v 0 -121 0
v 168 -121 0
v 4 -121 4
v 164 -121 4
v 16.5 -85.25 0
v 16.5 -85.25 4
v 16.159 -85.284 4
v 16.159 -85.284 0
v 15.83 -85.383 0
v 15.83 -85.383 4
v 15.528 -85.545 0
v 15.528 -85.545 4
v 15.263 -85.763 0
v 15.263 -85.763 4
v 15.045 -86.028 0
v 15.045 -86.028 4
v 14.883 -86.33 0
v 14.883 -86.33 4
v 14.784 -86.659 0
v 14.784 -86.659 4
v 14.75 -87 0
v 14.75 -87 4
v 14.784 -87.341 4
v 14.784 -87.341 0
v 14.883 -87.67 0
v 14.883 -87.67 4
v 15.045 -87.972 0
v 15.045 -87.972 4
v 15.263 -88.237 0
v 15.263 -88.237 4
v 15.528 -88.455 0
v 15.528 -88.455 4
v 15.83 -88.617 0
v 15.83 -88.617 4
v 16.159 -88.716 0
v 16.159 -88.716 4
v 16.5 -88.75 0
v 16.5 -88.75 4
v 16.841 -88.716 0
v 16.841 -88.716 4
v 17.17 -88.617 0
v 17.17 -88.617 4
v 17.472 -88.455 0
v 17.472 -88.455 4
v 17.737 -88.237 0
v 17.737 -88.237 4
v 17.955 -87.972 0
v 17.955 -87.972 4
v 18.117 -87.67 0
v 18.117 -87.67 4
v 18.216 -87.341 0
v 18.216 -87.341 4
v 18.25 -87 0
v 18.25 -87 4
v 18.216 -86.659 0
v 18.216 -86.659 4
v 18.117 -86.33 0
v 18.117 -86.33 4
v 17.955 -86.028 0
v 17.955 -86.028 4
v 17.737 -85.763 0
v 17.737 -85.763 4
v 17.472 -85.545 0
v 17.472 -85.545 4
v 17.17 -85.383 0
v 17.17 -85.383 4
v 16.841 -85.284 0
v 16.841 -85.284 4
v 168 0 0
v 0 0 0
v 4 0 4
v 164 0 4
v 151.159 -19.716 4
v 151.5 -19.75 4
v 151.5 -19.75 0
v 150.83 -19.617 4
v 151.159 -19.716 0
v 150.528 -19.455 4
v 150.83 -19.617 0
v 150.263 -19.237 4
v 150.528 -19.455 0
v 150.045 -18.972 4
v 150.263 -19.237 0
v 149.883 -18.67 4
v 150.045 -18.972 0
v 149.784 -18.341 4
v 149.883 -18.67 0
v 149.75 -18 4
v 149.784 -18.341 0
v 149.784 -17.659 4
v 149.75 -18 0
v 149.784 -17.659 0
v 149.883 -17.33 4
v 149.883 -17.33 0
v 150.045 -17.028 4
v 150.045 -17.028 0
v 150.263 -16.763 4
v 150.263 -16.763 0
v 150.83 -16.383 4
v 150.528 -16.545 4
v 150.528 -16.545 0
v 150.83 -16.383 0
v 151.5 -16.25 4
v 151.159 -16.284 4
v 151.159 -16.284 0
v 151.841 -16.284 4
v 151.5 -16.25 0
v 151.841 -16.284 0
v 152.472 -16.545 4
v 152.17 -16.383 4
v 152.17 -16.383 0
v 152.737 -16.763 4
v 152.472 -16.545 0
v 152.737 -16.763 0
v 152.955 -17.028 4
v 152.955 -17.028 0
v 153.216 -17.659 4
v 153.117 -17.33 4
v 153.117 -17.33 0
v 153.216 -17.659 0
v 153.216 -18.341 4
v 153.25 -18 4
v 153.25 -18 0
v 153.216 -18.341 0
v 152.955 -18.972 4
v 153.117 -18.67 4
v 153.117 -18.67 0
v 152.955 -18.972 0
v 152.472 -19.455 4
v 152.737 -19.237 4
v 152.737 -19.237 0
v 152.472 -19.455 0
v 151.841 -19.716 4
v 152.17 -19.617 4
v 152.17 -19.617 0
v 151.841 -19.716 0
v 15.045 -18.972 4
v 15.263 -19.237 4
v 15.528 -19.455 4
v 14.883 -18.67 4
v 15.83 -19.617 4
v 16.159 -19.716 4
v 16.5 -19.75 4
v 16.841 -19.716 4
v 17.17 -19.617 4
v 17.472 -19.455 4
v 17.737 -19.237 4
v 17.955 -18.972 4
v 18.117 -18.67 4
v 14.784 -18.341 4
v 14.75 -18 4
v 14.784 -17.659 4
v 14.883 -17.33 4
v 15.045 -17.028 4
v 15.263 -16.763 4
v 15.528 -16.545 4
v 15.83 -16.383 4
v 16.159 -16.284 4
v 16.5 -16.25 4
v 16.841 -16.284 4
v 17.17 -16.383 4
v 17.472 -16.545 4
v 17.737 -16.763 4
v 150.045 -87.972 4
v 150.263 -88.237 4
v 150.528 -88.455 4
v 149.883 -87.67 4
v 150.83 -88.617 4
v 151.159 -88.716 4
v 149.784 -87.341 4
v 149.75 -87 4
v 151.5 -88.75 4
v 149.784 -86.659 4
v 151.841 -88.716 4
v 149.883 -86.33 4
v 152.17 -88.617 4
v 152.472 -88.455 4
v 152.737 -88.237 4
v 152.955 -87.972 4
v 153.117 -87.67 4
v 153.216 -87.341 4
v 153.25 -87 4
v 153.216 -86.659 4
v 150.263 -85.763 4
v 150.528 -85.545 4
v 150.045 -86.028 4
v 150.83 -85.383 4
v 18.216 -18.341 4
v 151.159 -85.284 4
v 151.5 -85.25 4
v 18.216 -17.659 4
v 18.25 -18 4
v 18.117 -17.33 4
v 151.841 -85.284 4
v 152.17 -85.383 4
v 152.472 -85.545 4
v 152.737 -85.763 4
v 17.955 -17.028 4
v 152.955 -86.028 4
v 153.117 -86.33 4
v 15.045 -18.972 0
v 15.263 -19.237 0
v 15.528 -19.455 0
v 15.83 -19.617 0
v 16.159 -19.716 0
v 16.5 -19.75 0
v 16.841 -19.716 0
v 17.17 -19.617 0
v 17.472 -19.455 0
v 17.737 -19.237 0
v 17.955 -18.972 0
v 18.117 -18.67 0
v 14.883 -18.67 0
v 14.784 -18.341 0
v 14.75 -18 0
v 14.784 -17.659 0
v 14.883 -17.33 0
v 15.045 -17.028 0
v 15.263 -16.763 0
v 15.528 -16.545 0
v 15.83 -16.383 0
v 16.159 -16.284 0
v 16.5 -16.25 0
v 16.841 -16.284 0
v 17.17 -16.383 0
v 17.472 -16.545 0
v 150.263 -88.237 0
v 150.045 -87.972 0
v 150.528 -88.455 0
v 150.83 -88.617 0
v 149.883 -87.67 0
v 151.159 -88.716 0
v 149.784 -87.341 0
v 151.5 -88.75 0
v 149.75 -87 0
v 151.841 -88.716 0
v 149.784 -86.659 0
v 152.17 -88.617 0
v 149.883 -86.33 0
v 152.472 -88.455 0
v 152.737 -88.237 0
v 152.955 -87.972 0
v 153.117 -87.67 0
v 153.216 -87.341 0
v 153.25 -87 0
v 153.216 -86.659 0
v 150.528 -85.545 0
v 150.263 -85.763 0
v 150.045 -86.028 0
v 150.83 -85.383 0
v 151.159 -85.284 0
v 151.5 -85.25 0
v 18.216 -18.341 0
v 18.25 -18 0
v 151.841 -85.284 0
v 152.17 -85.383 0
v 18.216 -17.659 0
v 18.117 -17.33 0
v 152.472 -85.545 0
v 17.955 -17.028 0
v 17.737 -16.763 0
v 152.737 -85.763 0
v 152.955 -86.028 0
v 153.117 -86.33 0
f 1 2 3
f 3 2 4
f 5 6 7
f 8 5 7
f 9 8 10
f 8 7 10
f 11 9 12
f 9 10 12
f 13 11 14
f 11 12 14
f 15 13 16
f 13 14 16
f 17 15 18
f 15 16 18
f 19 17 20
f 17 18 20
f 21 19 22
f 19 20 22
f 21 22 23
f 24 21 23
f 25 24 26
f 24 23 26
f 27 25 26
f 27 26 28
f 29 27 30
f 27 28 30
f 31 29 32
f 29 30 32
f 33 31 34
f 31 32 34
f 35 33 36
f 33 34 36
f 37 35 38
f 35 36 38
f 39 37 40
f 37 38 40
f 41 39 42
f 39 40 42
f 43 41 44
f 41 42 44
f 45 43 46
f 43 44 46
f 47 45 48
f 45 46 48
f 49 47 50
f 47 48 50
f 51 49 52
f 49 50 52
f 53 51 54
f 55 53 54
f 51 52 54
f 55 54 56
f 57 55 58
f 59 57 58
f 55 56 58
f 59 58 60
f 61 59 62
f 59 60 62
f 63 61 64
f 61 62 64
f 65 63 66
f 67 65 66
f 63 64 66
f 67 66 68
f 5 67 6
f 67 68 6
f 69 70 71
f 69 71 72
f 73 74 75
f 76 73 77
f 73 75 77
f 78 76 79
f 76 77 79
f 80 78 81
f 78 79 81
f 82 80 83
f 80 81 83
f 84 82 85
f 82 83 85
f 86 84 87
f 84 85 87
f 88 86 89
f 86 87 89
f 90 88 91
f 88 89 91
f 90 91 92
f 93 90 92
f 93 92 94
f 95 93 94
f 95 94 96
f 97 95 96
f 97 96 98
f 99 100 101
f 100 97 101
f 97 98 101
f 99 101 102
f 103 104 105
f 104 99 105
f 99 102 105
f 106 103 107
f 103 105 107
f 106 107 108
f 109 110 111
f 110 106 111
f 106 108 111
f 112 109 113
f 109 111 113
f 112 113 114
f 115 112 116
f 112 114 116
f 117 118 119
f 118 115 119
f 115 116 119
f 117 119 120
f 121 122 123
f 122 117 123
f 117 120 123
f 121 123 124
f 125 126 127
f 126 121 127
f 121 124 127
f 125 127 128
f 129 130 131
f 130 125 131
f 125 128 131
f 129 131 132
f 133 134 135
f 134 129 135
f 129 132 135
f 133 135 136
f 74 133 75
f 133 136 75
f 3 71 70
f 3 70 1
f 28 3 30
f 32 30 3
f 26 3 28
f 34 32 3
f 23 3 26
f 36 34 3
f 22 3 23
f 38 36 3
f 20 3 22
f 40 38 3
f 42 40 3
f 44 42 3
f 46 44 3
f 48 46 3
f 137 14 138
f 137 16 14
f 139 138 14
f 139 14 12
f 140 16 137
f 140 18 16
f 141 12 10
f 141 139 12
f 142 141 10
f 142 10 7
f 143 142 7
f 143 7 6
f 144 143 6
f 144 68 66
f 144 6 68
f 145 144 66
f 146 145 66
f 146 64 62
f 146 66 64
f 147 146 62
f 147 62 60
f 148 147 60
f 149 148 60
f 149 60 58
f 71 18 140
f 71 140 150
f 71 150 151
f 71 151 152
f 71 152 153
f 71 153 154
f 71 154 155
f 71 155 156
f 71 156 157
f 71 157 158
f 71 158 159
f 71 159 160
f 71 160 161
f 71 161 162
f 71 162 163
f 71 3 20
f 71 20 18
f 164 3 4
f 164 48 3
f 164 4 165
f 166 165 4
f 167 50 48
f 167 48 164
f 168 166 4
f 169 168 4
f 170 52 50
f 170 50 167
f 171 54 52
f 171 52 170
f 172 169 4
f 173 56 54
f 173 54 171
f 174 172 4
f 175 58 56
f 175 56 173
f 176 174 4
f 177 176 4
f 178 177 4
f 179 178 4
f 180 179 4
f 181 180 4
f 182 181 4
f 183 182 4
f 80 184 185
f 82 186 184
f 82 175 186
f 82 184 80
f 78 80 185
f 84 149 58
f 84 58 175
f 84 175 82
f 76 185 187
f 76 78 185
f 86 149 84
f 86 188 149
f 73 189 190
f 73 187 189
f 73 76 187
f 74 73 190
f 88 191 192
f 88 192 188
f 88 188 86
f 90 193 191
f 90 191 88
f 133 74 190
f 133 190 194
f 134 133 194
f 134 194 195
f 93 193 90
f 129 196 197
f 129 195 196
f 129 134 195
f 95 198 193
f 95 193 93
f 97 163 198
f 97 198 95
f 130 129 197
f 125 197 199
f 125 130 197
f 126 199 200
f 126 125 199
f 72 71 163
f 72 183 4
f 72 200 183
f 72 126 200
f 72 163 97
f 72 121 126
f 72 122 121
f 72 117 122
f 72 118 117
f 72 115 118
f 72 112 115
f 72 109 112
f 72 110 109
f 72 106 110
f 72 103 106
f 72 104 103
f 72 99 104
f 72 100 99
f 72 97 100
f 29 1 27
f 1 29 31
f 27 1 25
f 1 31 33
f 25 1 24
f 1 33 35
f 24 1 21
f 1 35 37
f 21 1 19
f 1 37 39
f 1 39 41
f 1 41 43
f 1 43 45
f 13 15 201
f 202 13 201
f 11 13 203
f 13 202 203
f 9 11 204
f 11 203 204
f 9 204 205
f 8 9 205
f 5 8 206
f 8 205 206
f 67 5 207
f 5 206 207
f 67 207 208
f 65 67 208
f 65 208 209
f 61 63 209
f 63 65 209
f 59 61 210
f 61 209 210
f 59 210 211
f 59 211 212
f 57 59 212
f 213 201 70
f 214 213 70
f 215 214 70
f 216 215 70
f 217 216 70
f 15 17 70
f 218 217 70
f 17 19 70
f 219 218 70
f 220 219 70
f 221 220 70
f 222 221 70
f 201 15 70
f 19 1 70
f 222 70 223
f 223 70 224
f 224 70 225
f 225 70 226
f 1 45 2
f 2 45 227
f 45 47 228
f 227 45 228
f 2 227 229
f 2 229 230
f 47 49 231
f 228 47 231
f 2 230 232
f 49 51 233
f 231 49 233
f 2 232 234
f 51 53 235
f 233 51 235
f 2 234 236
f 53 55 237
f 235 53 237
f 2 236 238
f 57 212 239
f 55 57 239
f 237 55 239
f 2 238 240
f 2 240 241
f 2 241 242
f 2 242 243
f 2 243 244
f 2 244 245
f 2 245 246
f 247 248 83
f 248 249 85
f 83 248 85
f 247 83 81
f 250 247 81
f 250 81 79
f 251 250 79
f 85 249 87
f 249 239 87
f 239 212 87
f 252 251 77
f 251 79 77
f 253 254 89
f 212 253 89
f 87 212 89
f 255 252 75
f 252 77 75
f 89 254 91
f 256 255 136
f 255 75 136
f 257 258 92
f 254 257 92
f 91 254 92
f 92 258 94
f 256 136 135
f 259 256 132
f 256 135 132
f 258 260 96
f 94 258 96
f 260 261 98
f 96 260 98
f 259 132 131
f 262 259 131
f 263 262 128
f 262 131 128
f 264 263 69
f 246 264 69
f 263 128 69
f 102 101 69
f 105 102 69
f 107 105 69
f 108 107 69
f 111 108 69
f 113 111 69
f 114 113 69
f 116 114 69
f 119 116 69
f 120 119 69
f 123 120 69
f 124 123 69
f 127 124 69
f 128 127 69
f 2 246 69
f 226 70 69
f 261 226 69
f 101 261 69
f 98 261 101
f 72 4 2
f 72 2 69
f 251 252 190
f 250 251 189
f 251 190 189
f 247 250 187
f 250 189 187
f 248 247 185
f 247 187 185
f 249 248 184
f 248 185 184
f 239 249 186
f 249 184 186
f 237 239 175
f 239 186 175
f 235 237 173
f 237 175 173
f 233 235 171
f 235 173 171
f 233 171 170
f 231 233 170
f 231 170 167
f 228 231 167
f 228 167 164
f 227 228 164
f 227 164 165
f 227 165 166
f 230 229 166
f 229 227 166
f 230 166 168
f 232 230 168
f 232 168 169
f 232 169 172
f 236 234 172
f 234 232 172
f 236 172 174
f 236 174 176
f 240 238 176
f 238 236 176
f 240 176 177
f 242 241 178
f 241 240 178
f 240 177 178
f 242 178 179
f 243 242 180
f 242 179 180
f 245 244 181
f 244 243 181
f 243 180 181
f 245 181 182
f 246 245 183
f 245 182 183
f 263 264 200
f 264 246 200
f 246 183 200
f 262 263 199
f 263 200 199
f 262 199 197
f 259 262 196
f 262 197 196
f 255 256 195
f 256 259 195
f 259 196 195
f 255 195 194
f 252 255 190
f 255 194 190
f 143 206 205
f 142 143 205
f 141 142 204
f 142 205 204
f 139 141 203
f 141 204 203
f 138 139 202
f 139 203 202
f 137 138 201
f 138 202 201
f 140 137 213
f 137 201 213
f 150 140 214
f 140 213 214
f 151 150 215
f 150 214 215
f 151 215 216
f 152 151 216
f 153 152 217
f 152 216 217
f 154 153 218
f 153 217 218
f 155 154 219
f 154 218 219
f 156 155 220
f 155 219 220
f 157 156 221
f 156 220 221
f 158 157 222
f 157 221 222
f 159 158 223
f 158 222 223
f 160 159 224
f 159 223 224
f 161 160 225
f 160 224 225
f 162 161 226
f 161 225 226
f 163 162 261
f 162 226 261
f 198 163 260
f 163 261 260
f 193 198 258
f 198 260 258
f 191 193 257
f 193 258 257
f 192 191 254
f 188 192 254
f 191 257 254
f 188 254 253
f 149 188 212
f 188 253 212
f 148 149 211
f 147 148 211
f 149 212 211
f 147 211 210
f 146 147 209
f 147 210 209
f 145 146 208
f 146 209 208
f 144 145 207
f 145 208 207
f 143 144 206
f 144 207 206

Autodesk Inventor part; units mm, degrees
ref_plane "YZ Plane" through (0, 0, 0) normal (1, 0, 0) x (0, 1, 0)
ref_plane "XZ Plane" through (0, 0, 0) normal (0, 1, 0) x (-1, 0, 0)
ref_plane "XY Plane" through (0, 0, 0) normal (0, 0, 1) x (1, 0, 0)
sketch "Sketch1" plane through (0, 0, 0) normal (0, 0, 1) x (1, 0, 0)
  line L0 (0, 0) -> (168, 0)
  line L1 (168, 0) -> (168, -121)
  line L2 (168, -121) -> (0, -121)
  line L3 (0, -121) -> (0, 0)
  dimension "d0" = 168
  dimension "d1" = 121
extrude "Extrusion1" add sketch "Sketch1" along normal blind 4
sketch "Sketch2" plane through (0, 0, 0) normal (0, 0, -1) x (-1, 0, 0)
  line L0 (0, -121) -> (-168, -121) projected
  line L1 (0, -121) -> (-16.5, -121)
  line L2 (-16.5, -121) -> (-16.5, -87)
  line L3 (-16.5, -87) -> (0, -87)
  line L4 (0, -87) -> (0, -121)
  point P0 (0, 0)
  dimension "d4" = 16.5
  dimension "d5" = 34
hole "Hole1" at (16.5, -87, 0) direction (0, 0, 1) diameter 3.5 depth 8.8
ref_plane "Work Plane1" through (84, -121, 0) normal (-1, 0, 0) x (0, 0, 1)
ref_plane "Work Plane2" through (0, -60.5, 0) normal (0, 1, 0) x (1, 0, 0)
sketch "Sketch3" plane through (0, 0, 4) normal (0, 0, 1) x (1, 0, 0)
  line L0 (168, 0) -> (0, 0) projected
  line L1 (0, 0) -> (16.5, 0)
  line L2 (16.5, 0) -> (16.5, -18)
  line L3 (16.5, -18) -> (0, -18)
  line L4 (0, -18) -> (0, 0)
  dimension "d13" = 16.5
  dimension "d14" = 18
hole "Hole2" at (16.5, -18, 4) direction (0, 0, -1) diameter 3.5 depth 8.8
mirror "Mirror1" about plane through (84, -121, 0) normal (-1, 0, 0) of "Hole2", "Hole1"
chamfer "Chamfer1" distance 4 angle 45 2 edges at (0, -60.5, 4) (168, -60.5, 4)
properties part number "wall-left"
